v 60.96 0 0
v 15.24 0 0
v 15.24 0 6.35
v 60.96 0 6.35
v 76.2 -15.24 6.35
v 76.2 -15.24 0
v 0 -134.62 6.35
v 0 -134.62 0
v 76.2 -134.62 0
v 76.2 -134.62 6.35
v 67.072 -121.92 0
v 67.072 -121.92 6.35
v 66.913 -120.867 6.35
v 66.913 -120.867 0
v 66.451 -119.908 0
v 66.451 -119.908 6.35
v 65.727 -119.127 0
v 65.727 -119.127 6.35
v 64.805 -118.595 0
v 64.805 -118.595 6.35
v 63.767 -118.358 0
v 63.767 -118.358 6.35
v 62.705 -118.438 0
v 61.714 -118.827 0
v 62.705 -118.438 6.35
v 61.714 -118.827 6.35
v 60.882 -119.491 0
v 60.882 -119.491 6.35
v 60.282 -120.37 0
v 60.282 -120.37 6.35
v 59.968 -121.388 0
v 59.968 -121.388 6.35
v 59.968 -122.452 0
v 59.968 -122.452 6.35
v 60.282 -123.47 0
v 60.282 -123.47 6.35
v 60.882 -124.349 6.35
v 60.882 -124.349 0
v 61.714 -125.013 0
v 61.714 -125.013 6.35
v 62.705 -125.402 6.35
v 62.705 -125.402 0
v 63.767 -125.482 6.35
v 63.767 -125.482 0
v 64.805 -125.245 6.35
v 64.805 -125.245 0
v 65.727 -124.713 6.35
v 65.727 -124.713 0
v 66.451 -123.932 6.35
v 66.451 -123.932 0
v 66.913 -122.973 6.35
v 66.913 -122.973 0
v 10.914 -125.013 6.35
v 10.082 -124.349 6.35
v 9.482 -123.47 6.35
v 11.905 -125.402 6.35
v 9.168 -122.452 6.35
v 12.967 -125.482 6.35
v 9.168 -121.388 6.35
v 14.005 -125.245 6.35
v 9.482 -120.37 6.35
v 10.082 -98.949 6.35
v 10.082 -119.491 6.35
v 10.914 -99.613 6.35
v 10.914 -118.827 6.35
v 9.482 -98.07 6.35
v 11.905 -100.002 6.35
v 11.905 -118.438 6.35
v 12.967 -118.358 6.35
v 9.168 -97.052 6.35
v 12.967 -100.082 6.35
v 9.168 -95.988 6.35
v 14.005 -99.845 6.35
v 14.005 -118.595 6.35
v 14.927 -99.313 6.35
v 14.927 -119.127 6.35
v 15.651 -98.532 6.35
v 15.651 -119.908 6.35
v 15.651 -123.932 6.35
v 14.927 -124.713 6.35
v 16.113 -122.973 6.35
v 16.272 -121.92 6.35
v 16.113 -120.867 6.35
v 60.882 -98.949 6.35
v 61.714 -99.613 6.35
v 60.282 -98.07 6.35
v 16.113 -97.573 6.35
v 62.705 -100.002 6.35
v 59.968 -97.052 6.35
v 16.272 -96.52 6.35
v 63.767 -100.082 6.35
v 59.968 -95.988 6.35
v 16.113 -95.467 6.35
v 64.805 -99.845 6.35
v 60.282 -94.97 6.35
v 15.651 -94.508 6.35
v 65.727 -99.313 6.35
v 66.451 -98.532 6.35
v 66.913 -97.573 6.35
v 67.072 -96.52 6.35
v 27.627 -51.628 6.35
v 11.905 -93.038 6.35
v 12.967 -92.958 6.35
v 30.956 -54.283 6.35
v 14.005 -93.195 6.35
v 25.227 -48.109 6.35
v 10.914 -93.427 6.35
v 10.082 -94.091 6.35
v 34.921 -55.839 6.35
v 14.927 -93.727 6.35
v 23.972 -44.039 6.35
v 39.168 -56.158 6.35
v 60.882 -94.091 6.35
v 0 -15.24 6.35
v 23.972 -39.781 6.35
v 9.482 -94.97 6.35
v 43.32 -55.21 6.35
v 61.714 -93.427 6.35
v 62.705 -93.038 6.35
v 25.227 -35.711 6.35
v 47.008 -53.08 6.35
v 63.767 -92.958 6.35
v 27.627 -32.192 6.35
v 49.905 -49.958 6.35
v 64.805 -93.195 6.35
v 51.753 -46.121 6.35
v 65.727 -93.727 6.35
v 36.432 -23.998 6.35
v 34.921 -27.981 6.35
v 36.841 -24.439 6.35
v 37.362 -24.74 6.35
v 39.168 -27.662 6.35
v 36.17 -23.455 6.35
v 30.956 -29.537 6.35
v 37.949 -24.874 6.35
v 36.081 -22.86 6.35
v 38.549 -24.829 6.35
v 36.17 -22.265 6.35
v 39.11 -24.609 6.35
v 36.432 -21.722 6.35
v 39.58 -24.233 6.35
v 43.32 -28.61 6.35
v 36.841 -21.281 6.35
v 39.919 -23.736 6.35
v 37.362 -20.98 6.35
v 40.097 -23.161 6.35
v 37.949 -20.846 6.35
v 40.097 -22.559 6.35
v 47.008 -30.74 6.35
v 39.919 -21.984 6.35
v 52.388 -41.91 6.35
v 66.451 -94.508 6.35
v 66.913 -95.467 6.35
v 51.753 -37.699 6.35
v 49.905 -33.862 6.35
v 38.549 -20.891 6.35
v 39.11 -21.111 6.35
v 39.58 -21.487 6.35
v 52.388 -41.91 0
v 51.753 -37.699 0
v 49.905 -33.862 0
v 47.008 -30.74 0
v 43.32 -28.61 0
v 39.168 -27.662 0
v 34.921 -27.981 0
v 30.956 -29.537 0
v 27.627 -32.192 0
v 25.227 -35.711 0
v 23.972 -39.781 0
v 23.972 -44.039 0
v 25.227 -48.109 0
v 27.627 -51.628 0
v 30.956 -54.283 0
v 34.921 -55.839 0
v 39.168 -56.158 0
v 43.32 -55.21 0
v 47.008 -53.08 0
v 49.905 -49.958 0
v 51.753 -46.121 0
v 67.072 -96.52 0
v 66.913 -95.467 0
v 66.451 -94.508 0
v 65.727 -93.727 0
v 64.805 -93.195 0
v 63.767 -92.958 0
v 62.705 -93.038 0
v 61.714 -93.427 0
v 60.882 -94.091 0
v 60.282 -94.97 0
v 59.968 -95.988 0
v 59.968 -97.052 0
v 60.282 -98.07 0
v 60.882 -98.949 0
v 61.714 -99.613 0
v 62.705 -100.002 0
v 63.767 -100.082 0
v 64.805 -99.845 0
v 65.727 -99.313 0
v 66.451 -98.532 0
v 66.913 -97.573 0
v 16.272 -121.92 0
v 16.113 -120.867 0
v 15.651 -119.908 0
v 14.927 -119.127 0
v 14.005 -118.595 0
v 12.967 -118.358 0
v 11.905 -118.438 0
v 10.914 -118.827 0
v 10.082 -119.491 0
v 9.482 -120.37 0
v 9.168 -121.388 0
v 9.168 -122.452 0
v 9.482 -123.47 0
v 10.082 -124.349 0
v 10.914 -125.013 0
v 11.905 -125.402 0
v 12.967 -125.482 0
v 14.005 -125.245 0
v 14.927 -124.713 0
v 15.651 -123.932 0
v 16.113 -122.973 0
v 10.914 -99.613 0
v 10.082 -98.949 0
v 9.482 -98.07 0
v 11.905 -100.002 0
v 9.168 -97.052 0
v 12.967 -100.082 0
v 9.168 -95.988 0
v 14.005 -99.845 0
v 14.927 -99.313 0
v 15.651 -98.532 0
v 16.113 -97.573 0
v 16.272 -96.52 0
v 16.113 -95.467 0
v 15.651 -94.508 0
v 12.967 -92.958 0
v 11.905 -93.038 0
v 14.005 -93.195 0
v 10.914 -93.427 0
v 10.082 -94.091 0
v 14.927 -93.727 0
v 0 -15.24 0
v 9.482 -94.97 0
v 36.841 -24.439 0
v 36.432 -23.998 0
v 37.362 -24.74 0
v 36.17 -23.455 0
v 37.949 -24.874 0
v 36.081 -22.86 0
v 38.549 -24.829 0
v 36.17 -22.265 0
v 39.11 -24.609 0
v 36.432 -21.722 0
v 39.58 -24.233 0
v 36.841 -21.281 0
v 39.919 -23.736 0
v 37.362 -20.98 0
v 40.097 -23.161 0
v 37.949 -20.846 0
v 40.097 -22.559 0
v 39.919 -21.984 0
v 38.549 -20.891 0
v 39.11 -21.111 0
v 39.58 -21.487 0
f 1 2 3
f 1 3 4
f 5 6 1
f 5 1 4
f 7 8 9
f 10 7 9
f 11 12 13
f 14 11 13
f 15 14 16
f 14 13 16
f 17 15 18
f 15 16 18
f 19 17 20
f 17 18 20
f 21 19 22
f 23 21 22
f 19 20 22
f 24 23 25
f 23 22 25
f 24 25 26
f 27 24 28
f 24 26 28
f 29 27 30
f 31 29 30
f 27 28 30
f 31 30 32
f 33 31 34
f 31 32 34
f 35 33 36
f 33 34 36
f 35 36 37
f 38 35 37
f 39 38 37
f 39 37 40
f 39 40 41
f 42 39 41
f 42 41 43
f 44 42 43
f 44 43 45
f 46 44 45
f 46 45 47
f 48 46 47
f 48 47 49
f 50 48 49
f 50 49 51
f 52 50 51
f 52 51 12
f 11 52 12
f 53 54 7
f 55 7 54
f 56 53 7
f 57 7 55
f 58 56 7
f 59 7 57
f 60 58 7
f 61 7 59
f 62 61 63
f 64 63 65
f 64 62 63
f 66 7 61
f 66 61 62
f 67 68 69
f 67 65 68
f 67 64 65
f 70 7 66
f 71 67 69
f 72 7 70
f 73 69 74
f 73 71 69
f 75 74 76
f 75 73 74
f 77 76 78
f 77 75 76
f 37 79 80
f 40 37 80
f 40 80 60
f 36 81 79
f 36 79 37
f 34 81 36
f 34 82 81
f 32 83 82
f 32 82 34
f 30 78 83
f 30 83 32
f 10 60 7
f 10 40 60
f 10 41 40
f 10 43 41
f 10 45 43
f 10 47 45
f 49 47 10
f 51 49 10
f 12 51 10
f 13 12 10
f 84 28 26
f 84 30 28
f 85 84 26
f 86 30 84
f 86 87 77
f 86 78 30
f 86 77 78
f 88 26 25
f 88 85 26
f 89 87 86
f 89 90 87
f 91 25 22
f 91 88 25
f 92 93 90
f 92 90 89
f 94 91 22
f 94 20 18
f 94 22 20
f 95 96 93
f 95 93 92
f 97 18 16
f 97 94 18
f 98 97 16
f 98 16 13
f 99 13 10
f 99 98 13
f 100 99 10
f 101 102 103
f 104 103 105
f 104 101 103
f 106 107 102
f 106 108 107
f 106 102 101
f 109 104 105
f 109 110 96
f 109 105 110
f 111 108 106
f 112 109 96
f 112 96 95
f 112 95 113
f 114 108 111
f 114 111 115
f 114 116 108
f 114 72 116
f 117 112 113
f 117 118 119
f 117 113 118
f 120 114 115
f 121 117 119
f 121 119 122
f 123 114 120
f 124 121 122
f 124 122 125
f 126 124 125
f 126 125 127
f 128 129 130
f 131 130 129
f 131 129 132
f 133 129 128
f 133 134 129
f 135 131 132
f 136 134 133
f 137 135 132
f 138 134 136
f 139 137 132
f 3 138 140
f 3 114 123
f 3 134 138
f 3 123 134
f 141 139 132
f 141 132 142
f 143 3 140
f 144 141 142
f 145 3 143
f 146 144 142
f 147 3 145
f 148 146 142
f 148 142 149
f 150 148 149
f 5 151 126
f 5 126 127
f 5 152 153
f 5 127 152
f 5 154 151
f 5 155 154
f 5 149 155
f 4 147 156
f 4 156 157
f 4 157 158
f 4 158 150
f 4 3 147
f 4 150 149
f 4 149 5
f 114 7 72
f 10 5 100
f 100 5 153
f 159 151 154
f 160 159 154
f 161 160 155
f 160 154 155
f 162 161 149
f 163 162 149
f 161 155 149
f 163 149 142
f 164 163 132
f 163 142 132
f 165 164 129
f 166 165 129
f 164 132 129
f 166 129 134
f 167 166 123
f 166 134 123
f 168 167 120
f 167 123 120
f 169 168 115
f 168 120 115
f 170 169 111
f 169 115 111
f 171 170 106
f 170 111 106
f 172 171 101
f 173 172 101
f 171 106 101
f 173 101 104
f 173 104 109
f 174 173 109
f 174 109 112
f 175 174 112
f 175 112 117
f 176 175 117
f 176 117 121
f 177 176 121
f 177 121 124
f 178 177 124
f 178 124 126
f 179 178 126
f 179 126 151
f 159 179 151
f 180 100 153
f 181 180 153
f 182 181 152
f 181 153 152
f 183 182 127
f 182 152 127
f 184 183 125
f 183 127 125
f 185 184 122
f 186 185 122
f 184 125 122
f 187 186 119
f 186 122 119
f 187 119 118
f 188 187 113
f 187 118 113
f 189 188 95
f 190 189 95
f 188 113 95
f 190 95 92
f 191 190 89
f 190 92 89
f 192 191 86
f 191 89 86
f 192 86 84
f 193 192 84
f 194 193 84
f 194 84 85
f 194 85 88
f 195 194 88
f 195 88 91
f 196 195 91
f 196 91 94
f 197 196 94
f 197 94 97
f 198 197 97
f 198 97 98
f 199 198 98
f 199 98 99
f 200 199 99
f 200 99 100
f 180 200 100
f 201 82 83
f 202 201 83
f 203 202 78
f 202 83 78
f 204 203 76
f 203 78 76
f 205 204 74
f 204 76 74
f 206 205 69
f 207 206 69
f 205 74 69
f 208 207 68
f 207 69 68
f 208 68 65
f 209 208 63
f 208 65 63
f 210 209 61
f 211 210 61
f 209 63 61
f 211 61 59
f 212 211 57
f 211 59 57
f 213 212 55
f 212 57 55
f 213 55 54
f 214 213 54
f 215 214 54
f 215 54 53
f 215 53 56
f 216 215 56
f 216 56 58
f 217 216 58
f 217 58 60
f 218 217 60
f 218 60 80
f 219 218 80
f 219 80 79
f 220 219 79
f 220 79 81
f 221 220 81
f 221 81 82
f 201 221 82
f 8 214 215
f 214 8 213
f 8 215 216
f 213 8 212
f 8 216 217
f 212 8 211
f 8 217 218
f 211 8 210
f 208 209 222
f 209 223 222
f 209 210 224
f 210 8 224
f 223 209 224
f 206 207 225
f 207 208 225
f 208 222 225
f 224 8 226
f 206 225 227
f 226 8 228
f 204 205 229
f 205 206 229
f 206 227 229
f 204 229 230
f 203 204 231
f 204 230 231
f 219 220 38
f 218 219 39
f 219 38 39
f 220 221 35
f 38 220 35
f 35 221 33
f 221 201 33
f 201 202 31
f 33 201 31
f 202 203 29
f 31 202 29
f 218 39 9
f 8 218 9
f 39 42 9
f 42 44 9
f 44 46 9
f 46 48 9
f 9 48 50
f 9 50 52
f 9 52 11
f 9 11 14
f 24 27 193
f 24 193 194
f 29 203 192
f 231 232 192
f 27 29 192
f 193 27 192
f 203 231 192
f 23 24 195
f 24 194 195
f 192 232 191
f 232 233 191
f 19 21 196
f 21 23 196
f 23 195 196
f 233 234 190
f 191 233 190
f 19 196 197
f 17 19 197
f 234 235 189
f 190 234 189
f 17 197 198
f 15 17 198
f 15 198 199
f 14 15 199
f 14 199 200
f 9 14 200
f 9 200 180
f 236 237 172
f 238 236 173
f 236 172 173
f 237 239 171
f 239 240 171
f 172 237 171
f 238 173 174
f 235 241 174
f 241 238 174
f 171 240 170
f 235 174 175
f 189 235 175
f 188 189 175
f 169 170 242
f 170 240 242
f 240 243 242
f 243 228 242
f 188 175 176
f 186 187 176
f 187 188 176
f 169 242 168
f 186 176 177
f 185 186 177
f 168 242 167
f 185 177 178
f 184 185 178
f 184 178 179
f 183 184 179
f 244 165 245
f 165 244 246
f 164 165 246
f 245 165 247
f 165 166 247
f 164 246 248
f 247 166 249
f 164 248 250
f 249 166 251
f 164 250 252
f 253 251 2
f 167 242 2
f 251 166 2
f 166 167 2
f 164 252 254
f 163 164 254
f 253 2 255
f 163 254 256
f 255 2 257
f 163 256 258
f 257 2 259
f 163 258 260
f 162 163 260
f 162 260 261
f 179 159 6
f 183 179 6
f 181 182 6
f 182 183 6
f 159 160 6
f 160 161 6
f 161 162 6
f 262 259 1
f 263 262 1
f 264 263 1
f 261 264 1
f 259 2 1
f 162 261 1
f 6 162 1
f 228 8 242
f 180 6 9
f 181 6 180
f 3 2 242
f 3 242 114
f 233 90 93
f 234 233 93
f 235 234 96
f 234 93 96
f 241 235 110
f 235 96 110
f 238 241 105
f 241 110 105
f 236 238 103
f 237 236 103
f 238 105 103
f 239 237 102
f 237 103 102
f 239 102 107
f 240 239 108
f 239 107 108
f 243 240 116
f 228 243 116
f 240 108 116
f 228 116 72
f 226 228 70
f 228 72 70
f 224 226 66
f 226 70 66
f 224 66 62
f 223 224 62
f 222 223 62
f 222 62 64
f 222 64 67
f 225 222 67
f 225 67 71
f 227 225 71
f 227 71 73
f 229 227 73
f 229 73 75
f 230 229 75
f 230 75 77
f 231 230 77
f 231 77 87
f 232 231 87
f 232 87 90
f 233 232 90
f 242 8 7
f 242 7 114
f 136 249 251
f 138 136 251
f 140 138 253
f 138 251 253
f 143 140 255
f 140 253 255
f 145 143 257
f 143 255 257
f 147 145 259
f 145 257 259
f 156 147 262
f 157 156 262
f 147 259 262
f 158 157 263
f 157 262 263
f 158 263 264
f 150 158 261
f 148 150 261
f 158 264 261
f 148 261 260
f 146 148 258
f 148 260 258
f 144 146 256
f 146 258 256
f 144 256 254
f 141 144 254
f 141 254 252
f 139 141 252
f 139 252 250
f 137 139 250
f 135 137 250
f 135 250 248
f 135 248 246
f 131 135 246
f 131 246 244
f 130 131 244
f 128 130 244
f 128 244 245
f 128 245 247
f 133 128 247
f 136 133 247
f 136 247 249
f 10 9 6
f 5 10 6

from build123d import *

# Parameters (mm, degrees)
SKETCH1_W              = 76.2
SKETCH1_H              = 134.62
BOSS_EXTRUDE1_DEPTH    = 6.35
SKETCH2_R              = 14.2875
CUT_EXTRUDE1_DEPTH     = 155.820240602
SKETCH3_R              = 3.571875
CUT_EXTRUDE2_DEPTH     = 155.820240602
CHAMFER1_SIZE          = 15.24
F_10_32_TAPPED_HOLE1_D = 4.0386


with BuildPart() as part:
    # Sketch1 → Boss-Extrude1 (new body)
    with BuildSketch(Plane.XY):
        with Locations((38.1, -67.31)):
            Rectangle(SKETCH1_W, SKETCH1_H)
    extrude(amount=BOSS_EXTRUDE1_DEPTH)

    # Sketch2 → Cut-Extrude1 (cut, through all)
    with BuildSketch(Plane.XY.offset(6.35)):
        with Locations((38.1, -41.91)):
            Circle(SKETCH2_R)
    extrude(amount=-CUT_EXTRUDE1_DEPTH, mode=Mode.SUBTRACT)

    # Sketch3 → Cut-Extrude2 (cut, through all)
    with BuildSketch(Plane.XY.offset(6.35)):
        with Locations((12.7, -121.92)):
            Circle(SKETCH3_R)
        with Locations((63.5, -121.92)):
            Circle(SKETCH3_R)
        with Locations((12.7, -96.52)):
            Circle(SKETCH3_R)
        with Locations((63.5, -96.52)):
            Circle(SKETCH3_R)
    extrude(amount=-CUT_EXTRUDE2_DEPTH, mode=Mode.SUBTRACT)

    # Chamfer1
    chamfer1_edges = [part.edges().sort_by_distance(p)[0] for p in [
        (0, 0, 3.175),
        (76.2, 0, 3.175),
    ]]
    chamfer(chamfer1_edges, length=CHAMFER1_SIZE)

    # #10-32 Tapped Hole1 (through all)
    with Locations(Plane.XY.offset(6.35)):
        with Locations((38.1, -22.86)):
            Hole(F_10_32_TAPPED_HOLE1_D / 2)


solid = part.part
